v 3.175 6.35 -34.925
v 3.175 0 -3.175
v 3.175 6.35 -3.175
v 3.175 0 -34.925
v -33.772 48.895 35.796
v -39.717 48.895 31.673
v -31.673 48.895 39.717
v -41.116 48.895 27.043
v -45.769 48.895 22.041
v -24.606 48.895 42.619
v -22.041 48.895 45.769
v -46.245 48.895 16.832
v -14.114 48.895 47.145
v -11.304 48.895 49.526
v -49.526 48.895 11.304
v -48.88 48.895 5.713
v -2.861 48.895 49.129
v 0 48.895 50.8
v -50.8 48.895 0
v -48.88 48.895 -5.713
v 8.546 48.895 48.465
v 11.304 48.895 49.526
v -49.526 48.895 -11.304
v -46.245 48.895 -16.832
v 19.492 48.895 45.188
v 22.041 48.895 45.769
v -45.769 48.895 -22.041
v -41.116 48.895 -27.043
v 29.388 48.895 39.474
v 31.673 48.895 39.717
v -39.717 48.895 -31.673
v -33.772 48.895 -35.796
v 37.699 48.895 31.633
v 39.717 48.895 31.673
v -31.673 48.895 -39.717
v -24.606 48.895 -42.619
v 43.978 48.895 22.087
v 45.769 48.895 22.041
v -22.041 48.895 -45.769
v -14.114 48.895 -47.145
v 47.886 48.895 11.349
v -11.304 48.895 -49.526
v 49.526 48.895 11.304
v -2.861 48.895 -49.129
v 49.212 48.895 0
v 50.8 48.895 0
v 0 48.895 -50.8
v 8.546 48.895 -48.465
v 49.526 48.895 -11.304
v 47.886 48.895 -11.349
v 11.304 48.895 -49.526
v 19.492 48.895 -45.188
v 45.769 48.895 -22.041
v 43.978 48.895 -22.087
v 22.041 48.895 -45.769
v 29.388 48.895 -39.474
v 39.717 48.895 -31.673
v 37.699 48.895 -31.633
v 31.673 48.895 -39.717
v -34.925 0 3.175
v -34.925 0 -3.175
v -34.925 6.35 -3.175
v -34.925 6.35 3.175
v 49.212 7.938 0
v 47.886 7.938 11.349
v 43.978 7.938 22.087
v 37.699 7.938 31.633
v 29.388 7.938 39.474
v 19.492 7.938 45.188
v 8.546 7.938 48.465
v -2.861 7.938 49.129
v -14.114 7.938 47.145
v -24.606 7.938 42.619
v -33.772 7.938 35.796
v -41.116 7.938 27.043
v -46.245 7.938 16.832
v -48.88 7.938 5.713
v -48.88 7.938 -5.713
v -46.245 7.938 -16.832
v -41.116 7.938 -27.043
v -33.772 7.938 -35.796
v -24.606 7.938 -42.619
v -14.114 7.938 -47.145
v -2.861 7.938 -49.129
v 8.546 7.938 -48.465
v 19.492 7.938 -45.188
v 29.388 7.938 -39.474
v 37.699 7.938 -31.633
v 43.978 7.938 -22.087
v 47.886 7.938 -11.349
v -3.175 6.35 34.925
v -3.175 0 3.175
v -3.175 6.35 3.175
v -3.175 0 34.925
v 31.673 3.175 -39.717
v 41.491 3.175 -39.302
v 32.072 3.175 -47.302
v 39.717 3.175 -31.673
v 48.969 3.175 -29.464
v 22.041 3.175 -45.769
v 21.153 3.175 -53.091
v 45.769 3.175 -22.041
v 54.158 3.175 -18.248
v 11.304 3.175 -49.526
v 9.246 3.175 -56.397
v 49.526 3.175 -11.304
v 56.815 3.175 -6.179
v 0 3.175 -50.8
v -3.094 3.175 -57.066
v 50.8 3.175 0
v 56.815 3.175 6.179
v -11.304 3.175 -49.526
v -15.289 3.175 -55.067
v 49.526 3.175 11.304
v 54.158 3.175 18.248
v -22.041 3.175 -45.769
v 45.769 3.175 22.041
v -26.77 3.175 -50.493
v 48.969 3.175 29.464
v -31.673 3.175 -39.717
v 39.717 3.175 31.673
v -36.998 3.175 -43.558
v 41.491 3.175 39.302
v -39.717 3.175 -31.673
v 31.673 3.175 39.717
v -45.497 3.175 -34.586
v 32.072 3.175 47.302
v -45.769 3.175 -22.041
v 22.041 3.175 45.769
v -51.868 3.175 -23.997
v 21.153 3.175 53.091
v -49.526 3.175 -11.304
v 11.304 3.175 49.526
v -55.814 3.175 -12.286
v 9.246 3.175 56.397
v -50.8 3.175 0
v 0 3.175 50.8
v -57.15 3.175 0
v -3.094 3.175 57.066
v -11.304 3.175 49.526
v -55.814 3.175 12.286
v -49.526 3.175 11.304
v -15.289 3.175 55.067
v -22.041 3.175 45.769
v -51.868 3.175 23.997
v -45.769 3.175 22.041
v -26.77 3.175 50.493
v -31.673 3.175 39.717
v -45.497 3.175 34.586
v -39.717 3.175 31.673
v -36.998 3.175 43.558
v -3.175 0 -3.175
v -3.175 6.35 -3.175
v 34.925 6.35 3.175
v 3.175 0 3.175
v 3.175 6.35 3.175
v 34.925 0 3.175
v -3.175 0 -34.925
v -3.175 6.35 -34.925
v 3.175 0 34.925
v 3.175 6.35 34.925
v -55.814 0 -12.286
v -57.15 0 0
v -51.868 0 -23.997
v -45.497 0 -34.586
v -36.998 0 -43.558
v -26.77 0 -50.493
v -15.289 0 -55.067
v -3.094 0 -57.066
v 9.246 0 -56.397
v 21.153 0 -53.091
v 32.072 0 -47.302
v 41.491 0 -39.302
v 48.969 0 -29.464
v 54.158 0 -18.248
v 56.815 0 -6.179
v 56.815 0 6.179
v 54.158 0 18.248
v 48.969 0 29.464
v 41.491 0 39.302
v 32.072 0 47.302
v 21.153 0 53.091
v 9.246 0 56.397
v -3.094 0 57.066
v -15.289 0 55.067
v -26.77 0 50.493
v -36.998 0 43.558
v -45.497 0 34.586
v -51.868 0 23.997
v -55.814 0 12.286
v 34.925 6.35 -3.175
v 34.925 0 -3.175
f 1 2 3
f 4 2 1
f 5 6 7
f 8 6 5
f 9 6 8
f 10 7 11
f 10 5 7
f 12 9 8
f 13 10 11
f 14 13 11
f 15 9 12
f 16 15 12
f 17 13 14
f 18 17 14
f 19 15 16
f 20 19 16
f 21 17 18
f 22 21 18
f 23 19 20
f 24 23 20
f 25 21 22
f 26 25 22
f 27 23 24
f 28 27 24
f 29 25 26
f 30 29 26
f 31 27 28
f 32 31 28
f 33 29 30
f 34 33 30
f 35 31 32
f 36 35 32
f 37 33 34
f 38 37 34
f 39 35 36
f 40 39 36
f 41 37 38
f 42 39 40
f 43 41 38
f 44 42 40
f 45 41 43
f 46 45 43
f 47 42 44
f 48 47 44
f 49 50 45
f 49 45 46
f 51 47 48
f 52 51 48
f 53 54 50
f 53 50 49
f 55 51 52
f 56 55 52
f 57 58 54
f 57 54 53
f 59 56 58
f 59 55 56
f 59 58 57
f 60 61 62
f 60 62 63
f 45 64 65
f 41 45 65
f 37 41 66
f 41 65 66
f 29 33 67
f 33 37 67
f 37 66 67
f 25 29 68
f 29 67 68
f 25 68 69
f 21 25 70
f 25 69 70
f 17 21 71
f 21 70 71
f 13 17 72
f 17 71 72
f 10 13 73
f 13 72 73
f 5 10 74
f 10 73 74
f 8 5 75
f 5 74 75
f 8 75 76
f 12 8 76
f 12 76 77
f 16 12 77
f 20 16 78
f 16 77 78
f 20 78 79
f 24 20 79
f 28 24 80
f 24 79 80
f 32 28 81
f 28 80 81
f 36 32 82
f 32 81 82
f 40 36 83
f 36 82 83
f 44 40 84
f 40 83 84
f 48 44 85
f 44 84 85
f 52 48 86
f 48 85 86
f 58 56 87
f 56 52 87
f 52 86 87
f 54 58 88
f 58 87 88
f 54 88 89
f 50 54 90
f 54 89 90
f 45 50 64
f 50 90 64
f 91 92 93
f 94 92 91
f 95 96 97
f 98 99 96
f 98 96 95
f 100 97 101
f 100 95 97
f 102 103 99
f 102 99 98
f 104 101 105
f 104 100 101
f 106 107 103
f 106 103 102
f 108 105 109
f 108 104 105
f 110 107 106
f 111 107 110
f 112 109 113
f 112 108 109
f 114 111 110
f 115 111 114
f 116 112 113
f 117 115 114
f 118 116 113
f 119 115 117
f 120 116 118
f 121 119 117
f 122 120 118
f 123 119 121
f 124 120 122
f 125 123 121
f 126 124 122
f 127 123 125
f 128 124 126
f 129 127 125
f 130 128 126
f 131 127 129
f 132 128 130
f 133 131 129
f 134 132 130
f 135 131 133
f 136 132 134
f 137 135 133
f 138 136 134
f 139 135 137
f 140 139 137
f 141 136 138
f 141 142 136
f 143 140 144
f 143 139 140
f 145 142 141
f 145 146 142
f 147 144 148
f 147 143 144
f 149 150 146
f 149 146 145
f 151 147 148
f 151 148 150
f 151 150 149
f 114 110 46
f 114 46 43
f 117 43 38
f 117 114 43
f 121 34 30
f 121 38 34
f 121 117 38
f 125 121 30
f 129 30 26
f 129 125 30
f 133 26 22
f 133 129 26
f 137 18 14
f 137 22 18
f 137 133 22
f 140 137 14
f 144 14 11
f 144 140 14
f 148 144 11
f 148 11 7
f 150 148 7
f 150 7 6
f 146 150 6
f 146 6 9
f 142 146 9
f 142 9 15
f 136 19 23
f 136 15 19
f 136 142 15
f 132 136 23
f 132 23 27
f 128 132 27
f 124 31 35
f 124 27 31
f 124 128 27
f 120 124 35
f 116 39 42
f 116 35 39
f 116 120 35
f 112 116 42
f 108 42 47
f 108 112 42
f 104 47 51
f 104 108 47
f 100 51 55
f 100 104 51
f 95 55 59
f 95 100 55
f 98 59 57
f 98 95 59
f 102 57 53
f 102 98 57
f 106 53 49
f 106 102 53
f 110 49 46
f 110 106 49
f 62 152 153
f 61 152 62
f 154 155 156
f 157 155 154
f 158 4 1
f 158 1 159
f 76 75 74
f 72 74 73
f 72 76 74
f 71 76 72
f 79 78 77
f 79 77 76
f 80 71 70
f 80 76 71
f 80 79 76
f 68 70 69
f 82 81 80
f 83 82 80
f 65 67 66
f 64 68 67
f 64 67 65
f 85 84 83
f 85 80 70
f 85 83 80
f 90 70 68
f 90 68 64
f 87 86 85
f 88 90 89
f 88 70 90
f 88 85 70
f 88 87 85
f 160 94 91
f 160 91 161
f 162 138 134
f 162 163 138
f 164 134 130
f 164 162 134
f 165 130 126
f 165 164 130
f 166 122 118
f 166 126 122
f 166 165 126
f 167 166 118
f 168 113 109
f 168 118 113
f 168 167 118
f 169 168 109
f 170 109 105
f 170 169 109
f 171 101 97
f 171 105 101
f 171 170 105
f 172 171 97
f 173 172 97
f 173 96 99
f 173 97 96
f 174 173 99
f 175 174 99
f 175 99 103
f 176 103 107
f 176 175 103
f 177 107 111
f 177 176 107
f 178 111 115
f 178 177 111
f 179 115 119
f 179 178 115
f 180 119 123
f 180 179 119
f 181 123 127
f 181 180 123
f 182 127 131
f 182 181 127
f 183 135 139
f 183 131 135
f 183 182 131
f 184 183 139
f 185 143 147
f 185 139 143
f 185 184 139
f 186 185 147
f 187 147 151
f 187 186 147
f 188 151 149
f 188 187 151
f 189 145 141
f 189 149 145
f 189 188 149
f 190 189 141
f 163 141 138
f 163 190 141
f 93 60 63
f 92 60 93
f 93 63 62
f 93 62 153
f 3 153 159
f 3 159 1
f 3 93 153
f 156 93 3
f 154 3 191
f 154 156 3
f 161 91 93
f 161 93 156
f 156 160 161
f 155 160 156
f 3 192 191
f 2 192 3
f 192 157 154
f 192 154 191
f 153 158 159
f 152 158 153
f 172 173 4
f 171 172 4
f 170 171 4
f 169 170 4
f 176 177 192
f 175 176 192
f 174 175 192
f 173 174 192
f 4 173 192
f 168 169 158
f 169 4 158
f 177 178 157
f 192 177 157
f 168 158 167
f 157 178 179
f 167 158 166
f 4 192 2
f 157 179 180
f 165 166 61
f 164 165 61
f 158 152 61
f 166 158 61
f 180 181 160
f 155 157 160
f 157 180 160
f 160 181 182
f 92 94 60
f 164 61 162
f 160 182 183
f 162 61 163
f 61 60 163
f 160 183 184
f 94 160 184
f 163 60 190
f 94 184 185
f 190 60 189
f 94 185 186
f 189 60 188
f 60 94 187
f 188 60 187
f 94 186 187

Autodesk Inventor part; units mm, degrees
ref_plane "YZ Plane" through (0, 0, 0) normal (1, 0, 0) x (0, 1, 0)
ref_plane "XZ Plane" through (0, 0, 0) normal (0, 1, 0) x (-1, 0, 0)
ref_plane "XY Plane" through (0, 0, 0) normal (0, 0, 1) x (1, 0, 0)
sketch "Sketch1" plane through (0, 0, 0) normal (0, 1, 0) x (-1, 0, 0)
  circle A0 centre (0, 0) radius 57.15
  dimension "d0" = 114.3
extrude "Extrusion1" add sketch "Sketch1" along normal blind 3.175
sketch "Sketch2" plane through (0, 3.175, 0) normal (0, 1, 0) x (1, 0, 0)
  circle A0 centre (0, 0) radius 50.8
  circle A1 centre (0, 0) radius 49.2125
  dimension "d3" = 101.6
  dimension "d4" = 98.425
extrude "Extrusion2" add sketch "Sketch2" along normal blind 45.72
sketch "Sketch3" plane through (0, 3.175, 0) normal (0, 1, 0) x (1, 0, 0)
  circle A0 centre (0, 0) radius 49.2125
extrude "Extrusion3" add sketch "Sketch3" along normal blind 4.7625
sketch "Sketch4" plane through (0, 0, 0) normal (0, -1, 0) x (1, 0, 0)
  line L0 (3.175, 3.175) -> (34.925, 3.175)
  line L1 (34.925, 3.175) -> (34.925, -3.175)
  line L2 (34.925, -3.175) -> (3.175, -3.175)
  line L3 (3.175, -3.175) -> (3.175, -34.925)
  line L4 (3.175, -34.925) -> (-3.175, -34.925)
  line L5 (-3.175, -34.925) -> (-3.175, -3.175)
  line L6 (-3.175, -3.175) -> (-34.925, -3.175)
  line L7 (-34.925, -3.175) -> (-34.925, 3.175)
  line L8 (-34.925, 3.175) -> (-3.175, 3.175)
  line L9 (-3.175, 3.175) -> (-3.175, 34.925)
  line L10 (-3.175, 34.925) -> (3.175, 34.925)
  line L11 (3.175, 34.925) -> (3.175, 3.175)
  point P0 (0, 0)
  dimension "d9" = 31.75
  dimension "d10" = 6.35
  dimension "d11" = 31.75
  dimension "d12" = 6.35
  dimension "d13" = 31.75
  dimension "d14" = 31.75
extrude "Extrusion4" cut sketch "Sketch4" against normal blind 6.35
properties part number "Base Plug"
